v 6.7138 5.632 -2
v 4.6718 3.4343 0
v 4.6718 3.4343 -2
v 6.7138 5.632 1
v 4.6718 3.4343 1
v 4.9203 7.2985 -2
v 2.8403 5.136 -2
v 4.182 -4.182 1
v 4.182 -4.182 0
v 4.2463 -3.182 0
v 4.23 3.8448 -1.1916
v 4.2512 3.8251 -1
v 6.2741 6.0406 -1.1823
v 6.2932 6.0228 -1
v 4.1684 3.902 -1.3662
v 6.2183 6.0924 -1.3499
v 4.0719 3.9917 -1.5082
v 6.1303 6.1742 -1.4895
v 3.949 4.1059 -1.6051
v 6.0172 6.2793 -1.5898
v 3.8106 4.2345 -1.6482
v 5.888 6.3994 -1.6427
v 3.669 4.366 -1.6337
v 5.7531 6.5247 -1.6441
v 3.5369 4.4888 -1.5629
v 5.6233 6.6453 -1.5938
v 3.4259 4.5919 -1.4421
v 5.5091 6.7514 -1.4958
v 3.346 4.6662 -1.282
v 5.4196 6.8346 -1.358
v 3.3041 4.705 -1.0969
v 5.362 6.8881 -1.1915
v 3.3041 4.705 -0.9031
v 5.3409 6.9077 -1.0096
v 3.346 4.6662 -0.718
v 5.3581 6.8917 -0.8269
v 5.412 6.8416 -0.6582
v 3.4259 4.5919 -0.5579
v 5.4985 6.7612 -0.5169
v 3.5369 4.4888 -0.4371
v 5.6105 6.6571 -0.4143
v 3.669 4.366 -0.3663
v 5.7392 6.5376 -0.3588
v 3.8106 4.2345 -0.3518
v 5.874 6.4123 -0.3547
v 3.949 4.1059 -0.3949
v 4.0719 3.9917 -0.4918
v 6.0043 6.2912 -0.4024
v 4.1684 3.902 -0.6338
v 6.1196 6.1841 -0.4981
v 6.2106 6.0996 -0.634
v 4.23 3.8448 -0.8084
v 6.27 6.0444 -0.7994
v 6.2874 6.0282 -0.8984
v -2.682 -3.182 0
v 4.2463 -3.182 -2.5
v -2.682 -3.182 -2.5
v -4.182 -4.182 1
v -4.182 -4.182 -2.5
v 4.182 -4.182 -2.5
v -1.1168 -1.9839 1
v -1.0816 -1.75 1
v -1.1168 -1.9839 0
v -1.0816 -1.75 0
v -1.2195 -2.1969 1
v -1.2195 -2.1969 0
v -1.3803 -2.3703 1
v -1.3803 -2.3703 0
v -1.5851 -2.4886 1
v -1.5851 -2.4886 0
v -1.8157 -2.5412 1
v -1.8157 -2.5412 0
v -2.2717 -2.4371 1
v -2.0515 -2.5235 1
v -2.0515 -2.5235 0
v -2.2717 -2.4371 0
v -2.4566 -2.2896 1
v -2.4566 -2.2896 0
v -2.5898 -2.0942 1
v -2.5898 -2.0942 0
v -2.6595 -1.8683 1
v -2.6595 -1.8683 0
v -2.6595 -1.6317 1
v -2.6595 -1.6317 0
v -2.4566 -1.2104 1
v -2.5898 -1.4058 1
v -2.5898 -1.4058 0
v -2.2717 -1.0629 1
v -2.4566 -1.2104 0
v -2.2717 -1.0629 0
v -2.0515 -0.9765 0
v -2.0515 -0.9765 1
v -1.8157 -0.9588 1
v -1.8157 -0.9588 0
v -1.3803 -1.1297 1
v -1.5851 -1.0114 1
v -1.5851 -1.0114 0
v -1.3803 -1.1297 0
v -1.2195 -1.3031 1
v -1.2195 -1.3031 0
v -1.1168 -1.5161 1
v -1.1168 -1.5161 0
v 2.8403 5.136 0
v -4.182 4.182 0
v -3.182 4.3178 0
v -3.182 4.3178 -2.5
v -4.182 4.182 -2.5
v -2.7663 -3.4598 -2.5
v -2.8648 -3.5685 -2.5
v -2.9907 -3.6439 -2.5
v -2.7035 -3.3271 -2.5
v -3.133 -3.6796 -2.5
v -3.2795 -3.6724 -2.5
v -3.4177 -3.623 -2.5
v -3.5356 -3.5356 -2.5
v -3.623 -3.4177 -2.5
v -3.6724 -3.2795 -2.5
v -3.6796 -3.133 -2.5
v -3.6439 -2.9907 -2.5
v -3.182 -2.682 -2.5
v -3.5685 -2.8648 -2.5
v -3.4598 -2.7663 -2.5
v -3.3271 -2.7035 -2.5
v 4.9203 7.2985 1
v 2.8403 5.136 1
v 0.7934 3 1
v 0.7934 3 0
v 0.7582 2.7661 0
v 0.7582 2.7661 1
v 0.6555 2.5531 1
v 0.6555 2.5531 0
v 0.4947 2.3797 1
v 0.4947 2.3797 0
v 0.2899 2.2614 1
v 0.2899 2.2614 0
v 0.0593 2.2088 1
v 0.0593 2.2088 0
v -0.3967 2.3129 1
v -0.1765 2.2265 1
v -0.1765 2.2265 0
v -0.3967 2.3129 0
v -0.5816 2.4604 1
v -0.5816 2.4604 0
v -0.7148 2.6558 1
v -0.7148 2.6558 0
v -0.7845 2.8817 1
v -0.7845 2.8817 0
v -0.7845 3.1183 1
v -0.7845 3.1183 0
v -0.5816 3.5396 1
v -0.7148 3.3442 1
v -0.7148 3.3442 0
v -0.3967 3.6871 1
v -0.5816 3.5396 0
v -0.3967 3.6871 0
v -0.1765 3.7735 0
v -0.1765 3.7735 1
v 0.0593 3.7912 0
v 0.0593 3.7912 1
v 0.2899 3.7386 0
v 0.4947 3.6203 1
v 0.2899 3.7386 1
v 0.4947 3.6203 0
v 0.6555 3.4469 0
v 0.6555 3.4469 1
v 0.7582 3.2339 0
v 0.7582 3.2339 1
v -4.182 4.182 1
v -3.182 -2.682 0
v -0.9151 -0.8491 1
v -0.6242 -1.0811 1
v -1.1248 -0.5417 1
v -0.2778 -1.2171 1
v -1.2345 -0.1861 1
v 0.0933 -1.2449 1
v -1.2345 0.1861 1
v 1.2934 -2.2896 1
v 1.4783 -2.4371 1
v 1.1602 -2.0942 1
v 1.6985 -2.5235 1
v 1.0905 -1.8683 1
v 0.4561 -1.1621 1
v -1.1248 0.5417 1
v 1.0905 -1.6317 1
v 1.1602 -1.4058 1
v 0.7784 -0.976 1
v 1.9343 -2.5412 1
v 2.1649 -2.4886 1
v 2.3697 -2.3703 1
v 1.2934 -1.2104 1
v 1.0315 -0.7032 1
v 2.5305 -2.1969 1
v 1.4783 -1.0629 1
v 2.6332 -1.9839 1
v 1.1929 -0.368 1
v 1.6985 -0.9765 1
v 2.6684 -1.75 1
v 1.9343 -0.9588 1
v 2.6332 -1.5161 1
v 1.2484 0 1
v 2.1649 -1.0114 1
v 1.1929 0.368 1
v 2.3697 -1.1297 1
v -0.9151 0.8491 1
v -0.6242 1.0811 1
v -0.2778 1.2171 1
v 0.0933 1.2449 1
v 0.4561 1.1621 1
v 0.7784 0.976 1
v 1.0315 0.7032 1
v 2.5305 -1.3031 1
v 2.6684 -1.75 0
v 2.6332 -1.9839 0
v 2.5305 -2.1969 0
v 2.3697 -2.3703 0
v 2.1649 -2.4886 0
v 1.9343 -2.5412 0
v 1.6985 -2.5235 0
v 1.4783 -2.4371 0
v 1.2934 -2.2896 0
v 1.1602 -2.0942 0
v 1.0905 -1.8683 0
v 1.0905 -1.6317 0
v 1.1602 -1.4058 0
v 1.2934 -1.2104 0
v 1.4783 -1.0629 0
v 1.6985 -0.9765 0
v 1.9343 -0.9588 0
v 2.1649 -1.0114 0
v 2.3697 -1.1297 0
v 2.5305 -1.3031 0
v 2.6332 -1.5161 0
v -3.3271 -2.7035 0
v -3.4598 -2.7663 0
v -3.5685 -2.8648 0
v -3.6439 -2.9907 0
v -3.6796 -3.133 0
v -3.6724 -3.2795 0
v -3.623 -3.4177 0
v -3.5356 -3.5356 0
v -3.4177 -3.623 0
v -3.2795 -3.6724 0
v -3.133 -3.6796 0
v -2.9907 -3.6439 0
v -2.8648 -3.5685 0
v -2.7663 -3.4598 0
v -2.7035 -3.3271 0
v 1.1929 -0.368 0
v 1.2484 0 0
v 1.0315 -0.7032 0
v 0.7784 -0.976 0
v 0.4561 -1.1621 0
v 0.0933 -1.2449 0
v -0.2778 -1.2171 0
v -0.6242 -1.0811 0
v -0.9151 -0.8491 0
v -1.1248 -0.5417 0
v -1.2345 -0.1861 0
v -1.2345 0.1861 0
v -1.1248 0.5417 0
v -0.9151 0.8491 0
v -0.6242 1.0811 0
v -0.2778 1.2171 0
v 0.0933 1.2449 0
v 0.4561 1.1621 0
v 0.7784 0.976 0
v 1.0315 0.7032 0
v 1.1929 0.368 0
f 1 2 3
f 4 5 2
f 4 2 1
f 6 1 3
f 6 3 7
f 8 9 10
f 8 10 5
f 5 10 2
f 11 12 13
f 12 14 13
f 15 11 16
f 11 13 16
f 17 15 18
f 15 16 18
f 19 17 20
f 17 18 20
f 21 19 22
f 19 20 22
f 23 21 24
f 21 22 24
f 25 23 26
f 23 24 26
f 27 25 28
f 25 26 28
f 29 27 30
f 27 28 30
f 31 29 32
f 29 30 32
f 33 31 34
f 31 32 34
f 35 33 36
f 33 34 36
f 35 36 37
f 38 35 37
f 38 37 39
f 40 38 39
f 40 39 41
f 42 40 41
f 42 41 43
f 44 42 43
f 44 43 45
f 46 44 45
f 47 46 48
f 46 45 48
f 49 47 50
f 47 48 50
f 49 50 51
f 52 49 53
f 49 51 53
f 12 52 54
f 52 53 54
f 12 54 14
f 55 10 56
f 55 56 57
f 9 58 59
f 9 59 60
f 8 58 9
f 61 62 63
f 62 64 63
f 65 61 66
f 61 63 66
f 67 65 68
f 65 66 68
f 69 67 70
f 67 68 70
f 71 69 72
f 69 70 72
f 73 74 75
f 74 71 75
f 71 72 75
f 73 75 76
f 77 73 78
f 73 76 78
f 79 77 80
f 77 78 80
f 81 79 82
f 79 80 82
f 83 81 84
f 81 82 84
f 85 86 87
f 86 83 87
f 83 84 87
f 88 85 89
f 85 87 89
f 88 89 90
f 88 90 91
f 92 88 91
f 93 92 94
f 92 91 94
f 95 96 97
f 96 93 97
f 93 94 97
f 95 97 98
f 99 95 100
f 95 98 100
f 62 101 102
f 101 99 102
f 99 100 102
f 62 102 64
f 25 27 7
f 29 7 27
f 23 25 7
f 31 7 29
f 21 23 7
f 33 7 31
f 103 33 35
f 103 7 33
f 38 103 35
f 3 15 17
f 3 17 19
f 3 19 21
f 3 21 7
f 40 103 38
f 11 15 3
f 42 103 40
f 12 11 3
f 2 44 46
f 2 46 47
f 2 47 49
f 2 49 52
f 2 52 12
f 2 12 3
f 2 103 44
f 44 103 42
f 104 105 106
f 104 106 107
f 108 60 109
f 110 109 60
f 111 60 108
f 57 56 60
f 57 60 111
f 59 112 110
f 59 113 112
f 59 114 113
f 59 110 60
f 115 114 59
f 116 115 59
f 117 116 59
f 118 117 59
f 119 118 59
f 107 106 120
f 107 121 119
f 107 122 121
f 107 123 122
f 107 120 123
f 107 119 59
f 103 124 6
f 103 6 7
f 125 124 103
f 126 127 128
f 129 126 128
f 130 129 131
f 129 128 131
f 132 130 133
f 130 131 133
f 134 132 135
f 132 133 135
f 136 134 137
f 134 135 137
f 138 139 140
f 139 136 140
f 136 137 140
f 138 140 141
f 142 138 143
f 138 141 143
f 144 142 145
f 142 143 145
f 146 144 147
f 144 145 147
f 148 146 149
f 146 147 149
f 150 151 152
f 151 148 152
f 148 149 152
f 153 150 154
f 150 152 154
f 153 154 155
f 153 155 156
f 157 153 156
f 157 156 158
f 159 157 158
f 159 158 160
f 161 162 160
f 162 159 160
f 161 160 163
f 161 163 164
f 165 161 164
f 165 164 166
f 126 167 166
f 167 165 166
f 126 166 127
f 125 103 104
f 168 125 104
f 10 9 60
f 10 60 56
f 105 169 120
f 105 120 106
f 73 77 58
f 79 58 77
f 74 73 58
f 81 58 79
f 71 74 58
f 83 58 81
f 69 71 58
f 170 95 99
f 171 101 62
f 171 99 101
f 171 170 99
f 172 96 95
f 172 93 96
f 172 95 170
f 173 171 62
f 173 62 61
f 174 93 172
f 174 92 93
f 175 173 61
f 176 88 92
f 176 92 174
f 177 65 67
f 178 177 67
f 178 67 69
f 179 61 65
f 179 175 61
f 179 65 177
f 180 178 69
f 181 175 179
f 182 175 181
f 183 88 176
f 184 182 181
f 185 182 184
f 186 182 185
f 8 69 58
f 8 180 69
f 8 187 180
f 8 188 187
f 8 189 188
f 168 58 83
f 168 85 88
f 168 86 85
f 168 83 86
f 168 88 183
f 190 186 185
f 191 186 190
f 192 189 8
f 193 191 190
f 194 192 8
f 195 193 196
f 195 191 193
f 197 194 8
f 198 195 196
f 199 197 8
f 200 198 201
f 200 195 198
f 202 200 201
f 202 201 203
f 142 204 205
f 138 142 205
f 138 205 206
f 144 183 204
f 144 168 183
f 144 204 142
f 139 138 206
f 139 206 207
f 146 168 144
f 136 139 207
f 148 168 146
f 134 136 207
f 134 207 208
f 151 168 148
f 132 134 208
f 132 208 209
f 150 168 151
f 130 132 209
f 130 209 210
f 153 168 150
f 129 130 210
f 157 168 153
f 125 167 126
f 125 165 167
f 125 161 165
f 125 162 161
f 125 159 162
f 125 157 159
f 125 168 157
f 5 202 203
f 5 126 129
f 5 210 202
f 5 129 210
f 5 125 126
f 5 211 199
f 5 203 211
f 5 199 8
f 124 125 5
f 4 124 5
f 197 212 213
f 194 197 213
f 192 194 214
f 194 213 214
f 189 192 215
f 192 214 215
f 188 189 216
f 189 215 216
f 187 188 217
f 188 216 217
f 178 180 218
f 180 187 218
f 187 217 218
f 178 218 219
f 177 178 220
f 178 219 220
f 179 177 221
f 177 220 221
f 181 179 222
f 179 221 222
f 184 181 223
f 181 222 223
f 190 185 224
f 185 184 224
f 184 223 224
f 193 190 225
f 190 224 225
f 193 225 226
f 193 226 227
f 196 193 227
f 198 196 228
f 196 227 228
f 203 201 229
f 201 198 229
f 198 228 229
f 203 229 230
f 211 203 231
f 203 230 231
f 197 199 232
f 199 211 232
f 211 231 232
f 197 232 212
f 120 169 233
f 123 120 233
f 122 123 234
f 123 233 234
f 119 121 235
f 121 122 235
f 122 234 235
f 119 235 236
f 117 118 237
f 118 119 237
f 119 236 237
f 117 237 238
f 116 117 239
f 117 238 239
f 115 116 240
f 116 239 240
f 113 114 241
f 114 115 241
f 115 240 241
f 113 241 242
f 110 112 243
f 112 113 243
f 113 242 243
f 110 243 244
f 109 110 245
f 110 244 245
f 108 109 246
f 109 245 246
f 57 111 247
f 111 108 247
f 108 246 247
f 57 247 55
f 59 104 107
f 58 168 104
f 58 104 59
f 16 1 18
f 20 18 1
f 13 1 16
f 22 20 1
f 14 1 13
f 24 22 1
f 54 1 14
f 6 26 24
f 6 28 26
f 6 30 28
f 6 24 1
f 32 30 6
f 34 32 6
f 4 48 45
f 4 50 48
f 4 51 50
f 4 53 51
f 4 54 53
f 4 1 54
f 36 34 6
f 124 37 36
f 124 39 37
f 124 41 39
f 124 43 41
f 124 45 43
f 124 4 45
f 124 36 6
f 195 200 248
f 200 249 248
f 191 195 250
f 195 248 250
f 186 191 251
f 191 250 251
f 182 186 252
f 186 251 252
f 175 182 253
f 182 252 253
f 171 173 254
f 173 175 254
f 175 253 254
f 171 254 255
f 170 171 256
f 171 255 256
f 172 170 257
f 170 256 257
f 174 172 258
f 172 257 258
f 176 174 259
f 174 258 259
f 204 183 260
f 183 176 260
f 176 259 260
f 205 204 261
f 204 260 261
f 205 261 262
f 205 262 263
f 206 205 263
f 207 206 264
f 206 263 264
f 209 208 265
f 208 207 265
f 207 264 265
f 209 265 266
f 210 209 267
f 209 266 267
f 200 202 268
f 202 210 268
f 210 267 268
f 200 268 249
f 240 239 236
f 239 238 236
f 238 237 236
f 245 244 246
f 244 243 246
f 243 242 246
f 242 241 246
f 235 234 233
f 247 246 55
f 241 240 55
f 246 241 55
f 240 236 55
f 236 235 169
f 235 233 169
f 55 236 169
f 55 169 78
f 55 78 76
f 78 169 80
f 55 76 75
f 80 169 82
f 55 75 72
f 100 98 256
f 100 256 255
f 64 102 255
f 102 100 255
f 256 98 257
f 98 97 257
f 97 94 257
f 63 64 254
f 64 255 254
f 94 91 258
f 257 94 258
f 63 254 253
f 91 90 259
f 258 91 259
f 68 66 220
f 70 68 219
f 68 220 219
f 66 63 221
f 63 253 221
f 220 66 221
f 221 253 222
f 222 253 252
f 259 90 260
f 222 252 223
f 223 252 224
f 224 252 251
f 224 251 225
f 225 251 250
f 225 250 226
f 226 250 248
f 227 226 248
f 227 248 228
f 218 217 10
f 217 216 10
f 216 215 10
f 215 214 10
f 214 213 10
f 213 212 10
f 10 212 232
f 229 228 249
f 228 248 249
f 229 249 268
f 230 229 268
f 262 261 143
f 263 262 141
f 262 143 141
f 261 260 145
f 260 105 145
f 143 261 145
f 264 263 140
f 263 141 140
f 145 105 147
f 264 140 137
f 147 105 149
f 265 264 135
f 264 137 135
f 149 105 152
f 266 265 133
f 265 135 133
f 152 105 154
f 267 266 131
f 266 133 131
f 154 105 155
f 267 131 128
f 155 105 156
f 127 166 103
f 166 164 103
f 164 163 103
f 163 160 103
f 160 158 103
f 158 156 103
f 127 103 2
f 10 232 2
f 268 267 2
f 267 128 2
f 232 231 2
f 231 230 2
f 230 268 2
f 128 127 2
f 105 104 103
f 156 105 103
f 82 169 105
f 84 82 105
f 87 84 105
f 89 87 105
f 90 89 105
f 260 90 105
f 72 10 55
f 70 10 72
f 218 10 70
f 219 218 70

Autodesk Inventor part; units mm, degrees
ref_plane "YZ Plane" through (0, 0, 0) normal (1, 0, 0) x (0, 1, 0)
ref_plane "XZ Plane" through (0, 0, 0) normal (0, 1, 0) x (-1, 0, 0)
ref_plane "XY Plane" through (0, 0, 0) normal (0, 0, 1) x (1, 0, 0)
sketch "Sketch1" plane through (0, 0, 0) normal (0, 0, 1) x (1, 0, 0)
  line L0 (3.7674, 2.461) -> (4.3315, 3.068) construction
  line L1 (4.3315, 3.068) -> (2.5, 4.7697) construction
  line L2 (2.5, 4.7697) -> (2.94, 6) construction
  line L3 (2.94, 6) -> (-2, 6) construction
  line L4 (-2, 6) -> (-2, 4.0311) construction
  arc A0 (-2, 4.0311) -> (-3.182, 3.182) centre (0, 0) ccw construction
  line L5 (-3.182, 3.182) -> (-3.182, -3.182) construction
  line L6 (-3.182, -3.182) -> (3.182, -3.182) construction
  arc A1 (3.182, -3.182) -> (3.7674, 2.461) centre (0, 0) ccw construction
  circle A2 centre (0, 0) radius 1.2484
  circle A3 centre (0, 3) radius 0.7934
  circle A4 centre (1.875, -1.75) radius 0.7934
  circle A5 centre (-1.875, -1.75) radius 0.7934
  circle A6 centre (0, 0) radius 4 construction
  line L7 (-2, -4.0311) -> (-2, -3.182) construction
  arc A7 (-2, -4.0311) -> (3.182, -3.182) centre (0, 0) ccw construction
  line L8 (-2, -3.182) -> (3.182, -3.182) construction
  arc A8 (-2, 4.0311) -> (-2, -4.0311) centre (0, 0) ccw construction
  line L9 (-3.182, 3.182) -> (-4.182, 3.182) construction
  line L10 (-4.182, 3.182) -> (-4.182, 4.182) construction
  line L11 (-4.182, 4.182) -> (-3.182, 4.182) construction
  line L12 (-3.182, 4.182) -> (-3.182, 3.182) construction
  line L13 (3.182, -3.182) -> (4.182, -3.182) construction
  line L14 (4.182, -3.182) -> (4.182, -4.182) construction
  line L15 (4.182, -4.182) -> (3.182, -4.182) construction
  line L16 (3.182, -4.182) -> (3.182, -3.182) construction
  line L17 (4.182, -4.182) -> (-4.182, -4.182) construction
  line L18 (-4.182, -4.182) -> (-4.182, -3.182) construction
  line L19 (-4.182, -3.182) -> (4.182, -3.182) construction
  line L20 (4.182, -3.182) -> (4.182, -4.182) construction
  line L21 (-4.182, 4.182) -> (-3.182, 4.182) construction
  line L22 (-3.182, 4.182) -> (-3.182, -4.182) construction
  line L23 (-3.182, -4.182) -> (-4.182, -4.182) construction
  line L24 (-4.182, -4.182) -> (-4.182, 4.182) construction
  line L25 (4.3315, 3.068) -> (6.7138, 5.632) construction
  line L26 (4.3315, 3.068) -> (4.6718, 3.4343) construction
  line L27 (4.6718, 3.4343) -> (2.6832, 5.282) construction
  line L28 (6.7138, 5.632) -> (4.8824, 7.3337) construction
  line L29 (2.5, 4.7697) -> (4.8824, 7.3337) construction
  line L30 (2.8403, 5.136) -> (-3.182, 4.182) construction
  line L31 (4.6718, 3.4343) -> (4.182, -3.182) construction
  circle A9 centre (-3.182, -3.182) radius 0.5 construction
  line L32 (-4.182, 4.182) -> (-4.182, -4.182)
  line L33 (-4.182, -4.182) -> (4.182, -4.182)
  line L34 (4.182, -4.182) -> (4.6718, 3.4343)
  line L35 (6.7138, 5.632) -> (4.6718, 3.4343)
  line L36 (6.7138, 5.632) -> (4.9203, 7.2985)
  line L37 (4.9203, 7.2985) -> (2.8403, 5.136)
  line L38 (2.8403, 5.136) -> (-4.182, 4.182)
  dimension "d0" = 1
  dimension "d1" = 1
  dimension "d2" = 1
  dimension "d3" = 1
  dimension "d4" = 3.5
  dimension "d5" = 0.5
extrude "Extrusion1" add sketch "Sketch1" along normal blind 1
sketch "Sketch2" plane through (0, 0, 1) normal (0, 0, 1) x (1, 0, 0)
  circle A0 centre (0, 0) radius 1.2484
  circle A1 centre (0, 3) radius 0.7934
  line L0 (-3.182, -3.182) -> (3.182, -3.182) construction
  circle A2 centre (0, 0) radius 4 construction
  line L1 (-3.182, 3.182) -> (-3.182, -3.182) construction
  arc A3 (-2, 4.0311) -> (-2, -4.0311) centre (0, 0) ccw construction
  arc A4 (-2, 4.0311) -> (-3.182, 3.182) centre (0, 0) ccw construction
  arc A5 (3.182, -3.182) -> (3.7674, 2.461) centre (0, 0) ccw construction
  line L2 (3.7674, 2.461) -> (4.3315, 3.068) construction
  line L3 (4.3315, 3.068) -> (2.5, 4.7697) construction
  line L4 (-2, -3.182) -> (3.182, -3.182) construction
  arc A6 (-2, -4.0311) -> (3.182, -3.182) centre (0, 0) ccw construction
  line L5 (-2, -4.0311) -> (-2, -3.182) construction
  circle A7 centre (-1.875, -1.75) radius 0.7934
  line L6 (-2, 6) -> (-2, 4.0311) construction
  line L7 (2.5, 4.7697) -> (2.94, 6) construction
  line L8 (2.94, 6) -> (-2, 6) construction
  circle A8 centre (1.875, -1.75) radius 0.7934
  line L9 (-3.182, 3.182) -> (-4.182, 3.182) construction
  line L10 (-4.182, 3.182) -> (-4.182, 4.182) construction
  line L11 (-4.182, 4.182) -> (-3.182, 4.182) construction
  line L12 (-3.182, 4.182) -> (-3.182, 3.182) construction
  line L13 (3.182, -3.182) -> (4.182, -3.182) construction
  line L14 (4.182, -3.182) -> (4.182, -4.182) construction
  line L15 (4.182, -4.182) -> (3.182, -4.182) construction
  line L16 (3.182, -4.182) -> (3.182, -3.182) construction
  line L17 (4.182, -4.182) -> (-4.182, -4.182) construction
  line L18 (-4.182, -4.182) -> (-4.182, -3.182) construction
  line L19 (-4.182, -3.182) -> (4.182, -3.182) construction
  line L20 (4.182, -3.182) -> (4.182, -4.182) construction
  line L21 (-4.182, 4.182) -> (-3.182, 4.182) construction
  line L22 (-3.182, 4.182) -> (-3.182, -4.182) construction
  line L23 (-3.182, -4.182) -> (-4.182, -4.182) construction
  line L24 (-4.182, -4.182) -> (-4.182, 4.182) construction
  line L25 (4.3315, 3.068) -> (6.7138, 5.632) construction
  line L26 (4.3315, 3.068) -> (4.6718, 3.4343) construction
  line L27 (4.6718, 3.4343) -> (2.6832, 5.282) construction
  line L28 (6.7138, 5.632) -> (4.8824, 7.3337) construction
  line L29 (2.5, 4.7697) -> (4.8824, 7.3337) construction
  line L30 (2.8403, 5.136) -> (-3.182, 4.182) construction
  line L31 (4.6718, 3.4343) -> (4.182, -3.182) construction
  arc A9 (-3.182, -2.682) -> (-2.682, -3.182) centre (-3.182, -3.182) ccw
  line L32 (-4.182, 4.182) -> (-4.182, -4.182)
  line L33 (-4.182, -4.182) -> (4.182, -4.182)
  line L34 (4.182, -4.182) -> (4.6718, 3.4343)
  line L35 (6.7138, 5.632) -> (4.6718, 3.4343)
  line L36 (6.7138, 5.632) -> (4.9203, 7.2985)
  line L37 (4.9203, 7.2985) -> (2.8403, 5.136)
  line L38 (2.8403, 5.136) -> (-4.182, 4.182)
  line L39 (-3.182, -2.682) -> (-3.182, 4.3178)
  line L40 (2.8403, 5.136) -> (-4.182, 4.182) projected
  line L41 (-2.682, -3.182) -> (4.2463, -3.182)
  dimension "d8" = 1
  dimension "d9" = 1
  dimension "d10" = 1
  dimension "d11" = 1
  dimension "d12" = 3.5
  dimension "d13" = 0.5
extrude "Extrusion2" add sketch "Sketch2" along normal blind 2.5 contours A9 L41 L34 L33 L32 L38 L39
sketch "Sketch3" plane through (0, 0, 1) normal (0, 0, 1) x (1, 0, 0)
  circle A0 centre (0, 0) radius 1.2484
  circle A1 centre (0, 3) radius 0.7934
  line L0 (-3.182, -3.182) -> (3.182, -3.182) construction
  circle A2 centre (0, 0) radius 4 construction
  line L1 (-3.182, 3.182) -> (-3.182, -3.182) construction
  arc A3 (-2, 4.0311) -> (-2, -4.0311) centre (0, 0) ccw construction
  arc A4 (-2, 4.0311) -> (-3.182, 3.182) centre (0, 0) ccw construction
  arc A5 (3.182, -3.182) -> (3.7674, 2.461) centre (0, 0) ccw construction
  line L2 (3.7674, 2.461) -> (4.3315, 3.068) construction
  line L3 (4.3315, 3.068) -> (2.5, 4.7697) construction
  line L4 (-2, -3.182) -> (3.182, -3.182) construction
  arc A6 (-2, -4.0311) -> (3.182, -3.182) centre (0, 0) ccw construction
  line L5 (-2, -4.0311) -> (-2, -3.182) construction
  circle A7 centre (-1.875, -1.75) radius 0.7934
  line L6 (-2, 6) -> (-2, 4.0311) construction
  line L7 (2.5, 4.7697) -> (2.94, 6) construction
  line L8 (2.94, 6) -> (-2, 6) construction
  circle A8 centre (1.875, -1.75) radius 0.7934
  line L9 (-3.182, 3.182) -> (-4.182, 3.182) construction
  line L10 (-4.182, 3.182) -> (-4.182, 4.182) construction
  line L11 (-4.182, 4.182) -> (-3.182, 4.182) construction
  line L12 (-3.182, 4.182) -> (-3.182, 3.182) construction
  line L13 (3.182, -3.182) -> (4.182, -3.182) construction
  line L14 (4.182, -3.182) -> (4.182, -4.182) construction
  line L15 (4.182, -4.182) -> (3.182, -4.182) construction
  line L16 (3.182, -4.182) -> (3.182, -3.182) construction
  line L17 (4.182, -4.182) -> (-4.182, -4.182) construction
  line L18 (-4.182, -4.182) -> (-4.182, -3.182) construction
  line L19 (-4.182, -3.182) -> (4.182, -3.182) construction
  line L20 (4.182, -3.182) -> (4.182, -4.182) construction
  line L21 (-4.182, 4.182) -> (-3.182, 4.182) construction
  line L22 (-3.182, 4.182) -> (-3.182, -4.182) construction
  line L23 (-3.182, -4.182) -> (-4.182, -4.182) construction
  line L24 (-4.182, -4.182) -> (-4.182, 4.182) construction
  line L25 (4.3315, 3.068) -> (6.7138, 5.632) construction
  line L26 (4.3315, 3.068) -> (4.6718, 3.4343) construction
  line L27 (4.6718, 3.4343) -> (2.6832, 5.282) construction
  line L28 (6.7138, 5.632) -> (4.8824, 7.3337) construction
  line L29 (2.5, 4.7697) -> (4.8824, 7.3337) construction
  line L30 (2.8403, 5.136) -> (-3.182, 4.182) construction
  line L31 (4.6718, 3.4343) -> (4.182, -3.182) construction
  circle A9 centre (-3.182, -3.182) radius 0.5 construction
  line L32 (-4.182, 4.182) -> (-4.182, -4.182)
  line L33 (-4.182, -4.182) -> (4.182, -4.182)
  line L34 (4.182, -4.182) -> (4.6718, 3.4343)
  line L35 (6.7138, 5.632) -> (4.6718, 3.4343)
  line L36 (6.7138, 5.632) -> (4.9203, 7.2985)
  line L37 (4.9203, 7.2985) -> (2.8403, 5.136)
  line L38 (2.8403, 5.136) -> (-4.182, 4.182)
  line L39 (2.8403, 5.136) -> (-3.182, 4.3178) projected
  line L40 (4.2463, -3.182) -> (4.6718, 3.4343) projected
  line L41 (2.8403, 5.136) -> (4.6718, 3.4343)
  dimension "d16" = 1
  dimension "d17" = 1
  dimension "d18" = 1
  dimension "d19" = 1
  dimension "d20" = 3.5
  dimension "d21" = 0.5
extrude "Extrusion3" add sketch "Sketch3" along normal blind 2 contours L37 L36 L35 L41
sketch "Sketch4" plane through (4.9203, 7.2985, 3) normal (0.6807, 0.7326, 0) x (0.7326, -0.6807, 0)
  line L0 (2.4482, 2) -> (-0.0518, 2) construction
  line L1 (2.4482, 2) -> (2.4482, 0) construction
  line L2 (-0.0518, 0) -> (2.4482, 0) construction
  line L3 (-0.0518, 2) -> (-0.0518, 0) construction
  line L4 (2.4482, 0) -> (0, 0) construction
  line L5 (1.2241, 0) -> (-0.0518, 0) construction
  line L6 (-0.0518, 0) -> (-0.0518, 1) construction
  line L7 (-0.0518, 1) -> (1.2241, 1) construction
  line L8 (1.2241, 1) -> (1.2241, 0) construction
  circle A0 centre (1.2241, 1) radius 0.65
  dimension "d24" = 1.3
extrude "Extrusion4" cut sketch "Sketch4" against normal blind 3
sketch "Sketch5" plane through (0, 0, 0) normal (0, 0, -1) x (-1, 0, 0)
  line L0 (4.182, 4.182) -> (4.182, -4.182) projected
  line L1 (4.182, -4.182) -> (-4.182, -4.182) projected
  line L2 (-4.182, -4.182) -> (-4.2463, -3.182) projected
  line L3 (-4.2463, -3.182) -> (2.682, -3.182) projected
  arc A0 (2.682, -3.182) -> (3.182, -2.682) centre (3.182, -3.182) ccw projected
  line L4 (3.182, -2.682) -> (3.182, 4.3178) projected
  line L5 (3.182, 4.3178) -> (4.182, 4.182) projected
  point P0 (0, 0)
extrude "Extrusion5" add sketch "Sketch5" along normal blind 2.5
sketch "Sketch6" plane through (0, 0, 0) normal (0, 0, -1) x (-1, 0, 0)
  line L0 (-6.7138, 5.632) -> (-4.9203, 7.2985) projected
  line L1 (-4.9203, 7.2985) -> (-2.8403, 5.136) projected
  line L2 (-2.8403, 5.136) -> (-4.6718, 3.4343) projected
  line L3 (-4.6718, 3.4343) -> (-6.7138, 5.632) projected
  point P0 (0, 0)
extrude "Extrusion6" add sketch "Sketch6" along normal blind 2
sketch "Sketch7" plane through (4.9203, 7.2985, 3) normal (0.6807, 0.7326, 0) x (0.7326, -0.6807, 0)
  line L0 (2.4482, 5) -> (-0.0518, 5) projected
  circle A0 centre (1.2241, 4) radius 0.65
  point P0 (1.3634, 3)
extrude "Extrusion7" cut sketch "Sketch7" against normal blind 4
sketch "Sketch8" plane through (0, 0, 3.5) normal (0, 0, 1) x (1, 0, 0)
  line L0 (-4.9294, -4.4454) -> (7.7152, -4.4454)
  line L1 (7.7152, -4.4454) -> (7.7152, 7.9918)
  line L2 (7.7152, 7.9918) -> (-4.9294, 7.9918)
  line L3 (-4.9294, 7.9918) -> (-4.9294, -4.4454)
  point P0 (0, 0)
extrude "Extrusion8" cut sketch "Sketch8" against normal blind 2.5
properties part number "MS_Holderv11"
